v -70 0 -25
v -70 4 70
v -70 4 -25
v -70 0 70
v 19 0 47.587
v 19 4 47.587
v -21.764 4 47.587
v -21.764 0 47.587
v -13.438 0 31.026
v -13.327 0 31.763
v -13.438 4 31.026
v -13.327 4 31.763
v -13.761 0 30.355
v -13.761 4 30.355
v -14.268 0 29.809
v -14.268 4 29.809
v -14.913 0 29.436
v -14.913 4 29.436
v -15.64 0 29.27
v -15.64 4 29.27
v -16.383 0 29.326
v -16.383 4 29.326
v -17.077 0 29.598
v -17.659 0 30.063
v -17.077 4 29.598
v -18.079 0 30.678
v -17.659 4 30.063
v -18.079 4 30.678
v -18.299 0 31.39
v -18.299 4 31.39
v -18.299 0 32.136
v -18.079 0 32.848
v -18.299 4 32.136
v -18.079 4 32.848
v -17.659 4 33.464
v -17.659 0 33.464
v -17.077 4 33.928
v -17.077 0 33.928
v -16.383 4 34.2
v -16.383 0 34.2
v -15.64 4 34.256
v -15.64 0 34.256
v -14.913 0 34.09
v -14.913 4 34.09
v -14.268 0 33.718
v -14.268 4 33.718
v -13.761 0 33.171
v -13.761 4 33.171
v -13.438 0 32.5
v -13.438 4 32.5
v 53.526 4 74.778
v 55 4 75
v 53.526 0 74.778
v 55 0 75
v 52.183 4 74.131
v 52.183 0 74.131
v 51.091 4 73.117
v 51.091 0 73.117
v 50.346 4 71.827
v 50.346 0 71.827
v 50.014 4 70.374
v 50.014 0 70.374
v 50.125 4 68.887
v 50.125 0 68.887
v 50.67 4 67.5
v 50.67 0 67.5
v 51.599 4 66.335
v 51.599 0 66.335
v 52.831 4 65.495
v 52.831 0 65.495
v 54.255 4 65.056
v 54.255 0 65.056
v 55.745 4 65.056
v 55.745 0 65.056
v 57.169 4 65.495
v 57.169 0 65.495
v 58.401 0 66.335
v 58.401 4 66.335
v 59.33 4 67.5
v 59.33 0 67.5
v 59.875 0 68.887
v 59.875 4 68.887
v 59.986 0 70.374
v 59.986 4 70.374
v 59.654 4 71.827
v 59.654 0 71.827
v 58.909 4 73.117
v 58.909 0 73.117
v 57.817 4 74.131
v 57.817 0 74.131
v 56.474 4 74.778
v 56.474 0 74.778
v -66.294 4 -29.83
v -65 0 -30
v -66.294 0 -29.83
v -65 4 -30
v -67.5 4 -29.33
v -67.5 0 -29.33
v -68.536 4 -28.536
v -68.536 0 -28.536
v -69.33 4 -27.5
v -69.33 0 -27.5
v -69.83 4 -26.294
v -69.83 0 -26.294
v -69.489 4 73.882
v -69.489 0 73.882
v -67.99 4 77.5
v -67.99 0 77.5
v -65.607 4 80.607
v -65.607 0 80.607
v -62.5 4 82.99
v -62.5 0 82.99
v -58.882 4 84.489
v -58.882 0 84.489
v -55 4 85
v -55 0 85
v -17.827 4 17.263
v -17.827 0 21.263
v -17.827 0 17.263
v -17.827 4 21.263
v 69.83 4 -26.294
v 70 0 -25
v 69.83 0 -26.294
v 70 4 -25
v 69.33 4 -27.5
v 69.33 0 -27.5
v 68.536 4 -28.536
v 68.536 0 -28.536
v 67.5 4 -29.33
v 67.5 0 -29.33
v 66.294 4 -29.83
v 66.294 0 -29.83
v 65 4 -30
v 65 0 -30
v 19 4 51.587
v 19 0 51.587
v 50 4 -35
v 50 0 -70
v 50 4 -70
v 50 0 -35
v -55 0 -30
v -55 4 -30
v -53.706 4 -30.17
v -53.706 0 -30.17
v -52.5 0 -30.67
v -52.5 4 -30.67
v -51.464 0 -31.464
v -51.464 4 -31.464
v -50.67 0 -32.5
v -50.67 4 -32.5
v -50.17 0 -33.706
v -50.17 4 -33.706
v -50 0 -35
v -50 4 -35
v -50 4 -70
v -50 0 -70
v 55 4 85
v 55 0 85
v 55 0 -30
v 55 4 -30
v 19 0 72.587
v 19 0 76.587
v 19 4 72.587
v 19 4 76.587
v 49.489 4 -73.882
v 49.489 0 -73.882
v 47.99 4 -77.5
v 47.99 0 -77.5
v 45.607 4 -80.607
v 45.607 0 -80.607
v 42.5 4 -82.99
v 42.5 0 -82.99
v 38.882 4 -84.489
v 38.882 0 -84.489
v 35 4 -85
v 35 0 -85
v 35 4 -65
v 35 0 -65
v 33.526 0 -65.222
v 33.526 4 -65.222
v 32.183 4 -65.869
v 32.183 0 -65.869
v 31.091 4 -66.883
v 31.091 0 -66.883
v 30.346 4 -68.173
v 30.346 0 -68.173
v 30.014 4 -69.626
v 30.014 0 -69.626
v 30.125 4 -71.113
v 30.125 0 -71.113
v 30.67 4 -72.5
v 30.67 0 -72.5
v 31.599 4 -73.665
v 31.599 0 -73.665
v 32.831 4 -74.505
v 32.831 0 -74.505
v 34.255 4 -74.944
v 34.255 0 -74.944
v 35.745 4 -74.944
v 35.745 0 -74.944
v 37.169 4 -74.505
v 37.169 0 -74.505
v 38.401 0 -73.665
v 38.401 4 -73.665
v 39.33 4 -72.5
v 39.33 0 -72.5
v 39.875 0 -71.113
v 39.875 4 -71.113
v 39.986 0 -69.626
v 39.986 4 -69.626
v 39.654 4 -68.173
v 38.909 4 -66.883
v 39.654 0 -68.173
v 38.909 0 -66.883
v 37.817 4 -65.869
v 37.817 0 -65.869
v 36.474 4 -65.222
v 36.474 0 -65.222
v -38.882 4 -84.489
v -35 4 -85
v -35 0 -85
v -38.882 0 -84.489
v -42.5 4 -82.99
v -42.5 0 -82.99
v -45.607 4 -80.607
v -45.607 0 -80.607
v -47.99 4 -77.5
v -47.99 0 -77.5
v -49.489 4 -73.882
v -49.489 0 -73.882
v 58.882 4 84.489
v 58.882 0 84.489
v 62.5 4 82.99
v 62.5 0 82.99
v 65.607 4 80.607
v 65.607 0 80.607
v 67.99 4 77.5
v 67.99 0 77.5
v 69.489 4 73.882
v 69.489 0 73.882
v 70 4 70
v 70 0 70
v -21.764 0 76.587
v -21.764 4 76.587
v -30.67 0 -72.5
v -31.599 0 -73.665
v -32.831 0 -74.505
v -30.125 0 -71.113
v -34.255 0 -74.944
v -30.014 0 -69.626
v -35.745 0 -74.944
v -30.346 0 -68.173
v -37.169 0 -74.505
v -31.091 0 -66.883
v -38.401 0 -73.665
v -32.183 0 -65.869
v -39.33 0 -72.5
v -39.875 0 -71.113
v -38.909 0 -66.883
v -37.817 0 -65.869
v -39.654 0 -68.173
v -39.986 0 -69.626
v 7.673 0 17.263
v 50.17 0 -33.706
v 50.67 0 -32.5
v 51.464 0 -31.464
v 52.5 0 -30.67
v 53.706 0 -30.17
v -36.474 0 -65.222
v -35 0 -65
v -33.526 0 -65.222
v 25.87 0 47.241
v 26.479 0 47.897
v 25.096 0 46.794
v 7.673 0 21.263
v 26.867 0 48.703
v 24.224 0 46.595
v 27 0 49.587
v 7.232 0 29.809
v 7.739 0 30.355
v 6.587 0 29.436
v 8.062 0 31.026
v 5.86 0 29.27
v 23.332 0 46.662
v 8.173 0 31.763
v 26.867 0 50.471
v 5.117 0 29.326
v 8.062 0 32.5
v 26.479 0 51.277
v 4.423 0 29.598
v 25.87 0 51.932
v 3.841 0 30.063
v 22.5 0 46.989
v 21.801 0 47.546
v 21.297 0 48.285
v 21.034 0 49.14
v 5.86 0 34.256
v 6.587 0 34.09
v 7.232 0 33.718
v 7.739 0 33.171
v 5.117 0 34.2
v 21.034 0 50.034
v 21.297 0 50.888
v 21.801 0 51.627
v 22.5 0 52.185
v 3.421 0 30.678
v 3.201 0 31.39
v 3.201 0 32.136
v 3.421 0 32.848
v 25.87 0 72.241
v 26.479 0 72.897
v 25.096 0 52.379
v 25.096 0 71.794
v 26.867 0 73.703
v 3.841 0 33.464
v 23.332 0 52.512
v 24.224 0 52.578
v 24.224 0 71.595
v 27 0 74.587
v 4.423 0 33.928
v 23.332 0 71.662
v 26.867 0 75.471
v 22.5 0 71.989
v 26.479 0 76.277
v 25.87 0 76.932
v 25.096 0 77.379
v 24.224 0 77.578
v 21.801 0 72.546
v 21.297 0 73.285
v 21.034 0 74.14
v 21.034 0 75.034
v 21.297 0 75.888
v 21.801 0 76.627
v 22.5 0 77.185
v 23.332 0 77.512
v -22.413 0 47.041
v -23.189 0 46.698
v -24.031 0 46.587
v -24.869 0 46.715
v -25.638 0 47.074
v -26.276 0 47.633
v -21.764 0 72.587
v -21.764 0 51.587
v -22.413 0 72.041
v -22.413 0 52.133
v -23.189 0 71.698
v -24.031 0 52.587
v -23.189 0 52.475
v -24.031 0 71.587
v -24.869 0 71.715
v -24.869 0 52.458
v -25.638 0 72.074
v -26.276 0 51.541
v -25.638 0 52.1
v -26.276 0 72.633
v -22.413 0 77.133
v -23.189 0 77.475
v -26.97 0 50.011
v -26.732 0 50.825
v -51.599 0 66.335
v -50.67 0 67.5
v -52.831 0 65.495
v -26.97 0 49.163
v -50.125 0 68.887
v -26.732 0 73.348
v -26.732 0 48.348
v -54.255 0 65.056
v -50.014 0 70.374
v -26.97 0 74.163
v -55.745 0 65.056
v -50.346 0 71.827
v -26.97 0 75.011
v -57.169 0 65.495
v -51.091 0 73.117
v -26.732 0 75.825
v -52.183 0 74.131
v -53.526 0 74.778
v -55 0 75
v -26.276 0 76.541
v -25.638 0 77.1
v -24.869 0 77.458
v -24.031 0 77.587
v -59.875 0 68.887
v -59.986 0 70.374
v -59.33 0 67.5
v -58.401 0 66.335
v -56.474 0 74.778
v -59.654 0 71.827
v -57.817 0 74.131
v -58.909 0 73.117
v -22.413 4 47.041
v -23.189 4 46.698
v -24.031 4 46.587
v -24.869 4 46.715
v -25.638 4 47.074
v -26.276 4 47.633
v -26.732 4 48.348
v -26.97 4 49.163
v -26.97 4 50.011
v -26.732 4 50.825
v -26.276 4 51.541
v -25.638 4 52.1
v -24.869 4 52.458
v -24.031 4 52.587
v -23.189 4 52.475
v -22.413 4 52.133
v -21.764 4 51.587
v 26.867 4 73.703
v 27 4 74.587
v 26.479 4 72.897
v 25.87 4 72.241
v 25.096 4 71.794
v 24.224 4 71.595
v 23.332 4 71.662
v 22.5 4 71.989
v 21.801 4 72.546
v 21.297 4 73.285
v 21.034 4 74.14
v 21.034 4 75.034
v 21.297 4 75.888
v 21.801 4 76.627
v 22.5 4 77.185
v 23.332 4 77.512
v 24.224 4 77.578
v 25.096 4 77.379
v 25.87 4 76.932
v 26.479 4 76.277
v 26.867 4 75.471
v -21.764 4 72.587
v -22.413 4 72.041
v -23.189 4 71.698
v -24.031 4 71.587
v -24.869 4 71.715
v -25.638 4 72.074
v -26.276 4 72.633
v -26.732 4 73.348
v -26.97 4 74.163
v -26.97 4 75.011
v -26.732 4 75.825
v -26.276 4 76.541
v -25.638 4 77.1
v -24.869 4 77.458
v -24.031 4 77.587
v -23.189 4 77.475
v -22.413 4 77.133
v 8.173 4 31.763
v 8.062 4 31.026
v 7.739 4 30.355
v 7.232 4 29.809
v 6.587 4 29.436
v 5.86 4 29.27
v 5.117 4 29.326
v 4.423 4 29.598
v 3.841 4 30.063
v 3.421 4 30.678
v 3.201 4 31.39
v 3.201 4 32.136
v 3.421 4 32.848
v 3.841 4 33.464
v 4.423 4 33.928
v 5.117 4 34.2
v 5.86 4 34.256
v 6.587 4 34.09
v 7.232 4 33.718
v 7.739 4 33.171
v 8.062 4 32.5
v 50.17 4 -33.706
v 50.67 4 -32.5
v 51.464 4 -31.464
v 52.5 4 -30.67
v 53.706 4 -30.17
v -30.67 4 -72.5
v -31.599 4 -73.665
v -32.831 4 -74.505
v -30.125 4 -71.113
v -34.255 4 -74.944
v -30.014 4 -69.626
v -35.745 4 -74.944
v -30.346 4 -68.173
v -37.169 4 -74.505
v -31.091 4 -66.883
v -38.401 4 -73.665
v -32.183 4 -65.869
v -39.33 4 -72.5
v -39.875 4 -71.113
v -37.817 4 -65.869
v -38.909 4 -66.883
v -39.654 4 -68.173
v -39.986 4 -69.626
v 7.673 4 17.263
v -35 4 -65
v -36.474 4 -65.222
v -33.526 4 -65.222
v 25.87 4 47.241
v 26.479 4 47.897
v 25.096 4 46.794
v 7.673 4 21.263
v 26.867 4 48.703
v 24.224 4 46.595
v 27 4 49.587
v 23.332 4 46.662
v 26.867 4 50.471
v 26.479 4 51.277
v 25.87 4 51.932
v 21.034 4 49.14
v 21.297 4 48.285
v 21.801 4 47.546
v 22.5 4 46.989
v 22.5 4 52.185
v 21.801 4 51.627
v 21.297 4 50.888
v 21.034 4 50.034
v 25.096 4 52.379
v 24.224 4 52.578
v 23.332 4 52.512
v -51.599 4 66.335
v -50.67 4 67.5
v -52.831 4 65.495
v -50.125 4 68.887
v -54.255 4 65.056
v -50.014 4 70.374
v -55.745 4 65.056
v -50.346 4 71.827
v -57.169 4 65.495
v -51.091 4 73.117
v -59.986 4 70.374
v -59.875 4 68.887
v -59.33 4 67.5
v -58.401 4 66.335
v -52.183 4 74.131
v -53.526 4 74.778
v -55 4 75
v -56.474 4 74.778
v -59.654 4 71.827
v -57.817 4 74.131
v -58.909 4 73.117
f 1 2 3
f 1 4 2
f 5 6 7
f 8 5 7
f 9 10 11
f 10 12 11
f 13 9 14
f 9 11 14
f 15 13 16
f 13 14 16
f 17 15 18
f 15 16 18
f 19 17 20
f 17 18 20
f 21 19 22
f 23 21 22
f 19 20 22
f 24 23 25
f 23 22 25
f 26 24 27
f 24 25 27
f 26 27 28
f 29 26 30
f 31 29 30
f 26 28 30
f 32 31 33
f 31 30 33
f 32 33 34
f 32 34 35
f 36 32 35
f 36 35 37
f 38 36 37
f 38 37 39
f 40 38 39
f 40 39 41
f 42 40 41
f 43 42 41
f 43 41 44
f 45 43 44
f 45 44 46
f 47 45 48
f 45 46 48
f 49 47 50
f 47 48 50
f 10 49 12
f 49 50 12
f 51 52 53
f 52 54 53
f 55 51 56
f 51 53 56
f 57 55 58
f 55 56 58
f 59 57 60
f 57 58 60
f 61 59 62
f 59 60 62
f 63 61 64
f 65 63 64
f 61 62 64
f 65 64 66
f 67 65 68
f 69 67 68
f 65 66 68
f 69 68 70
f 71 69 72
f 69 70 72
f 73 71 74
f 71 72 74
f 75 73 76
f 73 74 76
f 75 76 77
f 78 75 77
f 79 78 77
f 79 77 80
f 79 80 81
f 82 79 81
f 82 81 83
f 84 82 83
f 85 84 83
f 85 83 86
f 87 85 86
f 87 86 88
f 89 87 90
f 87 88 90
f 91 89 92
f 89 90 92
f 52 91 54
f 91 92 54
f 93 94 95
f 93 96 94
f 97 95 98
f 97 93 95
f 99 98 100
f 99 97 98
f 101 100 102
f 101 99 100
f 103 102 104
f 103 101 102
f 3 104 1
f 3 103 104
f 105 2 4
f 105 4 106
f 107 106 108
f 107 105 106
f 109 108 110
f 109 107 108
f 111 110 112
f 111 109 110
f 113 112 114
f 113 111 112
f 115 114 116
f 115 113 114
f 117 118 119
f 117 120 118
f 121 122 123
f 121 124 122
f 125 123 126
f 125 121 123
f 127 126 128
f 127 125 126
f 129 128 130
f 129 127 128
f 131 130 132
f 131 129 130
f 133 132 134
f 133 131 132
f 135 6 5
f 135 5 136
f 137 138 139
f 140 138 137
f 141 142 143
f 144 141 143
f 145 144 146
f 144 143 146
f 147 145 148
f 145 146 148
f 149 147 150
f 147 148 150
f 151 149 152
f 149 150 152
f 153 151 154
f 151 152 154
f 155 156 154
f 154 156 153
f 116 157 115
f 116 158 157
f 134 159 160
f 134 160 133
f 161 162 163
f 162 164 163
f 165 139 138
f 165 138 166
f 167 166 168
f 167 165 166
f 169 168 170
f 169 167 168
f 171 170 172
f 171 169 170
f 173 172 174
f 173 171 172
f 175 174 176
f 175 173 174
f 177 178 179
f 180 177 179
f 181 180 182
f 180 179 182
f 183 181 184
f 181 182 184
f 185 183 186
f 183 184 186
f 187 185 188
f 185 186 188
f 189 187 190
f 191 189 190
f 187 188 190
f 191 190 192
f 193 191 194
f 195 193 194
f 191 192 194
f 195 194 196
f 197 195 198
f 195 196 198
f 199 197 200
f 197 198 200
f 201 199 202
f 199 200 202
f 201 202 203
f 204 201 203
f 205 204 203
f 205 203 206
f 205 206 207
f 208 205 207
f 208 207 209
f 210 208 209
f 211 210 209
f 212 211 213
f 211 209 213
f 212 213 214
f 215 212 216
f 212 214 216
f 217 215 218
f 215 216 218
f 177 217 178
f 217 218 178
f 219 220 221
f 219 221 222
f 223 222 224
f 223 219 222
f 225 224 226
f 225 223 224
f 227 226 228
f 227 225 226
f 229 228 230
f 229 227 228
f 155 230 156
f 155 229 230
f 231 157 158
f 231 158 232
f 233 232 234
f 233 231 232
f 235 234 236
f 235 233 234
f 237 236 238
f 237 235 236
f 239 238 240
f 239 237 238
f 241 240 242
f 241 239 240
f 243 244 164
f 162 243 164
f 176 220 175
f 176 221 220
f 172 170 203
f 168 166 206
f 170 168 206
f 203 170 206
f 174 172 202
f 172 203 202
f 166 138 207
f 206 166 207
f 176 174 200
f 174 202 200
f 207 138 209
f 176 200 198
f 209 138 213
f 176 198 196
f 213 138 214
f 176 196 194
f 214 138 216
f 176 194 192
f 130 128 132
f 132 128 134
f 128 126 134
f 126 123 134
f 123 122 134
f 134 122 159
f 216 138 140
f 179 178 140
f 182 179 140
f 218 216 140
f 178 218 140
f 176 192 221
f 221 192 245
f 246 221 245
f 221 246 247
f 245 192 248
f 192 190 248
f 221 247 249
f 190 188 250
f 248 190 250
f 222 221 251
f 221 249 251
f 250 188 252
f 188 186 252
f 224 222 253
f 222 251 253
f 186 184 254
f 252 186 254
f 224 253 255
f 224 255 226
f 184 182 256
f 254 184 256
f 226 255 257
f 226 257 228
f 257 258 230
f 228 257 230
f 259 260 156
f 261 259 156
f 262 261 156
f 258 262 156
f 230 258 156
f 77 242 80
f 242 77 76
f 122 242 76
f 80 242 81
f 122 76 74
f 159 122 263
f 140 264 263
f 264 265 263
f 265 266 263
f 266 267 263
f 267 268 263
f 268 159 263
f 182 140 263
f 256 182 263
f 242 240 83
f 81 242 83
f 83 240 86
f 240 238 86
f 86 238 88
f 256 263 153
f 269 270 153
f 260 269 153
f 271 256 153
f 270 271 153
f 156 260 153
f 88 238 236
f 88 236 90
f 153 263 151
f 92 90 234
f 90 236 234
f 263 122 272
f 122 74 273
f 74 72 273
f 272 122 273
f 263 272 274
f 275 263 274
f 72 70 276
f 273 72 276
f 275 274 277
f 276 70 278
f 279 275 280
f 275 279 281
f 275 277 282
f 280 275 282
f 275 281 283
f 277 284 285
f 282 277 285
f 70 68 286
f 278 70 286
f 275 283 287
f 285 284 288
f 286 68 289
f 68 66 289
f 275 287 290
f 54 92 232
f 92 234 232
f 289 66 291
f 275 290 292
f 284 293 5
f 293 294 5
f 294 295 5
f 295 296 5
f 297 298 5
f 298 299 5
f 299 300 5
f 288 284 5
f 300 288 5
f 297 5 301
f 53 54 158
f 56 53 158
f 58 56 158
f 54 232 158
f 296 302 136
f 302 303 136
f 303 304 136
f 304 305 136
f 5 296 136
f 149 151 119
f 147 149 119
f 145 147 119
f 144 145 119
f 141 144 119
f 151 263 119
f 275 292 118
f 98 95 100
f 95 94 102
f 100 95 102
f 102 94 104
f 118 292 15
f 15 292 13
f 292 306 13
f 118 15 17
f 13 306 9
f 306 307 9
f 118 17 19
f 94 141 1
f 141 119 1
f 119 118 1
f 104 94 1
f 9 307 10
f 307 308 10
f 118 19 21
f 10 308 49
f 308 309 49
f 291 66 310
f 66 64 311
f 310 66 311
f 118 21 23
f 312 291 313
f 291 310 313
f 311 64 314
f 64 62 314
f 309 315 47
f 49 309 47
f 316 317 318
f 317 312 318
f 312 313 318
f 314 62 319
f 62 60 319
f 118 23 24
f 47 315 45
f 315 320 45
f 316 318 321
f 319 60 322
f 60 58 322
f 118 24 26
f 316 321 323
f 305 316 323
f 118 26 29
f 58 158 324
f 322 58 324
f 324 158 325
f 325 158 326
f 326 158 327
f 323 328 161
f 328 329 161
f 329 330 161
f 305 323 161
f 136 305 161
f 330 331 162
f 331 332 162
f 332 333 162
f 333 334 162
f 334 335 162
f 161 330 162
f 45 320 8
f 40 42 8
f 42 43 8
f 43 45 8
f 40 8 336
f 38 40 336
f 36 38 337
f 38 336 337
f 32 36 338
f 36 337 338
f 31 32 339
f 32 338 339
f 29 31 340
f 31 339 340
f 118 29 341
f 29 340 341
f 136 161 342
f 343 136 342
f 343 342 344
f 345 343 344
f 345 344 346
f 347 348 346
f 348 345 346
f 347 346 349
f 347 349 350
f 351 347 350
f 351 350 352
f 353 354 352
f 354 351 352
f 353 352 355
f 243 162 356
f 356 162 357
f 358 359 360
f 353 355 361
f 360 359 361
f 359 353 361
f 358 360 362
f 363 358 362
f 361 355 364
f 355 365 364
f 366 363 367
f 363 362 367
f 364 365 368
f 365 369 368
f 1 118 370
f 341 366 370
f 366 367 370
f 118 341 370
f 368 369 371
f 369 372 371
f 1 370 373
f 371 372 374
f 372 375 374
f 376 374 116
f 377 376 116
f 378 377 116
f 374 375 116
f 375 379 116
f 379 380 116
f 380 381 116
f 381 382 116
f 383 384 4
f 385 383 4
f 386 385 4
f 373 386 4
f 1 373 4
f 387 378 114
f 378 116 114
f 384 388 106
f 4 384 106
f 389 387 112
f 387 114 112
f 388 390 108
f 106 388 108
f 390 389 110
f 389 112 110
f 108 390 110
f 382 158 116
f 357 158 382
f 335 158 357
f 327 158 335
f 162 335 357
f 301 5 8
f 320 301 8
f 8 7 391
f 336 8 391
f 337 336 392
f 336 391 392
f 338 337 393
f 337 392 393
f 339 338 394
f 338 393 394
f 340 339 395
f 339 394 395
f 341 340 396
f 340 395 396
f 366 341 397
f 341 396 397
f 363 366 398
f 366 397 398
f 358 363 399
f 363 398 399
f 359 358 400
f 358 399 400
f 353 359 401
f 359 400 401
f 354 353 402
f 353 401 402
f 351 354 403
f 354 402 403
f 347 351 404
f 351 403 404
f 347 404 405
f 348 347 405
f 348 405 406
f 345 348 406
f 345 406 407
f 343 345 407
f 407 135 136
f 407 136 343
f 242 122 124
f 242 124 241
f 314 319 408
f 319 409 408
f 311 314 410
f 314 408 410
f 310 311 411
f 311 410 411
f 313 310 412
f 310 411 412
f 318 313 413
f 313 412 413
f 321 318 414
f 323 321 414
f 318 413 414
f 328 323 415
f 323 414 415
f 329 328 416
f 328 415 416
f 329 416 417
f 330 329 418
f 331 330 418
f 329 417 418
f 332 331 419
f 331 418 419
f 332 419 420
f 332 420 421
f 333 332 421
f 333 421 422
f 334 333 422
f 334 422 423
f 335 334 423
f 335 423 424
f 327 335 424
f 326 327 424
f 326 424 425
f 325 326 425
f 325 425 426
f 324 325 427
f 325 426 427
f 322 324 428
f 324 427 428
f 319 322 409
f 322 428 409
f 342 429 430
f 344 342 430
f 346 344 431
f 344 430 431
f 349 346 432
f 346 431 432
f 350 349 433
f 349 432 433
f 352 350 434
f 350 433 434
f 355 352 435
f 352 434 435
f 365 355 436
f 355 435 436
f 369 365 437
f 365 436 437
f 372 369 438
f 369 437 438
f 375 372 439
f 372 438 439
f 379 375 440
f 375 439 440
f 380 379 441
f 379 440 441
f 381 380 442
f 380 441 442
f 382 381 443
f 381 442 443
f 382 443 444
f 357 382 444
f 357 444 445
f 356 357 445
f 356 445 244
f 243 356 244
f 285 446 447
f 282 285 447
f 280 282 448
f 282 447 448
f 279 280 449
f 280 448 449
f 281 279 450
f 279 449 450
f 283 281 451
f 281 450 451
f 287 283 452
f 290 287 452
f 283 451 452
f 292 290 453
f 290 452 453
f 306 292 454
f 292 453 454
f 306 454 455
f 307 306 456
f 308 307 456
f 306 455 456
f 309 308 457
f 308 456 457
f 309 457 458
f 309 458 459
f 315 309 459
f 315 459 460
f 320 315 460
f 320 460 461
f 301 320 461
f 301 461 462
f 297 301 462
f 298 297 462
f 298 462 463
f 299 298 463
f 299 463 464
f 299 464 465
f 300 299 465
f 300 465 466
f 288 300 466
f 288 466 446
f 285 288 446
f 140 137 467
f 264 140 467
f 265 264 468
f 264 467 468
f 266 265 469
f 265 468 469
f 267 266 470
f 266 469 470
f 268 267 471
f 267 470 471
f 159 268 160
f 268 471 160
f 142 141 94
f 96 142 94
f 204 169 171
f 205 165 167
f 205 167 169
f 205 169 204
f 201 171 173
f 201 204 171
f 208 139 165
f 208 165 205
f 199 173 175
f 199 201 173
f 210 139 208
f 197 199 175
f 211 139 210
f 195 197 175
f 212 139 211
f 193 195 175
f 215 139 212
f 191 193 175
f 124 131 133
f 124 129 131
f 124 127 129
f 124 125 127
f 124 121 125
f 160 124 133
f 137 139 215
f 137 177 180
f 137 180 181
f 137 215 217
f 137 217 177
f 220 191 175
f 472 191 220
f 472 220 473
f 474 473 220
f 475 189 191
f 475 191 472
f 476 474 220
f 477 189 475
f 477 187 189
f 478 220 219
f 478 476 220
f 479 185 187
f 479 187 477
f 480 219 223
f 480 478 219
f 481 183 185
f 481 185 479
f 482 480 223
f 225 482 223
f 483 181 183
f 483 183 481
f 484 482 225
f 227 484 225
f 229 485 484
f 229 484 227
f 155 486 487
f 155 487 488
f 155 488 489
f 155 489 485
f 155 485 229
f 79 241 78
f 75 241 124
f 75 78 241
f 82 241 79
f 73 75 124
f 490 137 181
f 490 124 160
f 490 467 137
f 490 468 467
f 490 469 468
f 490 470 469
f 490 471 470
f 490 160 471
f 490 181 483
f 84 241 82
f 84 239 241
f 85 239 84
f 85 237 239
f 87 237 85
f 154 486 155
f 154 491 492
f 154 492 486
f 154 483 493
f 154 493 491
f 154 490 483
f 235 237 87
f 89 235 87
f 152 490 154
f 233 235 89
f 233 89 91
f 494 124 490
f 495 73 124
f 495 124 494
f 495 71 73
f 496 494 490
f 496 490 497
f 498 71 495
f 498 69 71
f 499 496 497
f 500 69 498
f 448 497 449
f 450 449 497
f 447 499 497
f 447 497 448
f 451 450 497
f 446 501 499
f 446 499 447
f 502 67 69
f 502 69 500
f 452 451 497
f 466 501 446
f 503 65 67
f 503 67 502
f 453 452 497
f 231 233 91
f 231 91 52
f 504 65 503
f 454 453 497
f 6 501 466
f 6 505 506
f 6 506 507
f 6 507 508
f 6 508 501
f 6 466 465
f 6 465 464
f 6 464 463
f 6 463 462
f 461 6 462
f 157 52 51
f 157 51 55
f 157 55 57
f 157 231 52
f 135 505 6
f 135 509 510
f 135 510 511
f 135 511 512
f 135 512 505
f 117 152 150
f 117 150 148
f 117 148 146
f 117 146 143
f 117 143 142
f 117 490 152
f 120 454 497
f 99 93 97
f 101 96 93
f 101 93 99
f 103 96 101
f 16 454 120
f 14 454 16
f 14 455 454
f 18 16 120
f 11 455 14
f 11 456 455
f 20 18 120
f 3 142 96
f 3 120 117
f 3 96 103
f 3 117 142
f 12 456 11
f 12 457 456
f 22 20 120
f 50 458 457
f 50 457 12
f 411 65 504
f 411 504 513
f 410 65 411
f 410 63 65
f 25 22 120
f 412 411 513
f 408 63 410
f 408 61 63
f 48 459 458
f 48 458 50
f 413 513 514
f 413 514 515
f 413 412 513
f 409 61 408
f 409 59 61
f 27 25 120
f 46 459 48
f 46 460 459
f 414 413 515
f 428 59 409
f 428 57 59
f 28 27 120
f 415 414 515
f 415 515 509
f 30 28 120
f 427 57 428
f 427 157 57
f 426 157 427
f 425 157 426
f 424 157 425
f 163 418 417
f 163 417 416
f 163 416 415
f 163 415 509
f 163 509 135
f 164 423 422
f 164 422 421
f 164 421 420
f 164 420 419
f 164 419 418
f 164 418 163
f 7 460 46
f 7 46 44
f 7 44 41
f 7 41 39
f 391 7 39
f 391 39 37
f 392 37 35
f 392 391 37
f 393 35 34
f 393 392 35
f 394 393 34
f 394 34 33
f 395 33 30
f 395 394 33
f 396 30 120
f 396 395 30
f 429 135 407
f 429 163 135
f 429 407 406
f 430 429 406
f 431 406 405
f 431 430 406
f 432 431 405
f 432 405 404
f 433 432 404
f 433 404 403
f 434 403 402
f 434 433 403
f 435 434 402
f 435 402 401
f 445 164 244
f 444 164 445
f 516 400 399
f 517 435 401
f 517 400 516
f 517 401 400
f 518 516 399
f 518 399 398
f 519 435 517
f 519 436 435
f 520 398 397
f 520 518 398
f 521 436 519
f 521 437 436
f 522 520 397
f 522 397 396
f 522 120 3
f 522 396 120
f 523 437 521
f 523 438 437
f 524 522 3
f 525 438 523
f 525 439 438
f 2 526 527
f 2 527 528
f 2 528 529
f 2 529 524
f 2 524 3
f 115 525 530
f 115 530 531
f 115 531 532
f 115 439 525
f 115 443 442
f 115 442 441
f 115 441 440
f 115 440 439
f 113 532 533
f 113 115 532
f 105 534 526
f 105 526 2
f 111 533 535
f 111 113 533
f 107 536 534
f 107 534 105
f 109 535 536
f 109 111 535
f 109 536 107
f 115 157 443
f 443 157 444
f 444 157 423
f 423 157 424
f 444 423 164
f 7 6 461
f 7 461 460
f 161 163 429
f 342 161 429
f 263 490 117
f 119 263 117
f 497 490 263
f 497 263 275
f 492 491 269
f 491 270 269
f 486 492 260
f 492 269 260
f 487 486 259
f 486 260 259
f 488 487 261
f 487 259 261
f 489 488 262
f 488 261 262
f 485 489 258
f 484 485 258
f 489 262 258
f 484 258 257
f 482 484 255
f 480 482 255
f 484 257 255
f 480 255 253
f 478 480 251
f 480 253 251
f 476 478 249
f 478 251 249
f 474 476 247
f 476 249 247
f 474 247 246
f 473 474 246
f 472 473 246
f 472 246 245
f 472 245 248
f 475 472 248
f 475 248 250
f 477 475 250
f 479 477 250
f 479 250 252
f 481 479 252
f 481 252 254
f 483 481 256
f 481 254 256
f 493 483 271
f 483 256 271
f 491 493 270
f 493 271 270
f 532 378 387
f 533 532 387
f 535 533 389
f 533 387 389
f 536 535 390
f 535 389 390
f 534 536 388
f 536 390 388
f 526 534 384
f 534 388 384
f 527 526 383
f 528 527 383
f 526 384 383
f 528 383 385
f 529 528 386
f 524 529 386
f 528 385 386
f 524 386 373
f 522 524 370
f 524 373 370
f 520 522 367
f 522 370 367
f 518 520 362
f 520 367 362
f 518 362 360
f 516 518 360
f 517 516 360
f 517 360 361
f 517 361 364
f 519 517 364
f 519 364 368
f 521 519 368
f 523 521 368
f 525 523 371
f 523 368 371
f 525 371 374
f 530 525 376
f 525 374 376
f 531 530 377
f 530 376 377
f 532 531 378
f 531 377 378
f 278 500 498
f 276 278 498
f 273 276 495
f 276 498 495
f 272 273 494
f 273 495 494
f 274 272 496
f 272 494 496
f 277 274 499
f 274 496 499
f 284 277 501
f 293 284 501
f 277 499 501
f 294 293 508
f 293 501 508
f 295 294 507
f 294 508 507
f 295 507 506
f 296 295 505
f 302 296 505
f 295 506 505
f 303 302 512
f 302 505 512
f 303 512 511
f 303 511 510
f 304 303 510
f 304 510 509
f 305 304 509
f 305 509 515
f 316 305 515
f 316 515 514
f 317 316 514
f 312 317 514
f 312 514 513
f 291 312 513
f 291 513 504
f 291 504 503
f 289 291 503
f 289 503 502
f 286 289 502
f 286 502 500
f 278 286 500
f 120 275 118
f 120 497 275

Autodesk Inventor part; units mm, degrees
ref_plane "YZ Plane" through (0, 0, 0) normal (1, 0, 0) x (0, 1, 0)
ref_plane "XZ Plane" through (0, 0, 0) normal (0, 1, 0) x (-1, 0, 0)
ref_plane "XY Plane" through (0, 0, 0) normal (0, 0, 1) x (1, 0, 0)
sketch "Sketch1" plane through (0, 0, 0) normal (0, 1, 0) x (-1, 0, 0)
  line L0 (-70, 85) -> (70, 85)
  line L1 (70, 85) -> (70, -85)
  line L2 (70, -85) -> (-70, -85)
  line L3 (-70, -85) -> (-70, 85)
  line L4 (-70, 85) -> (70, -85) construction
  line L5 (70, 85) -> (-70, -85) construction
  line L6 (98, 0) -> (-98, 0) projected
  line L7 (70, -85) -> (50, -85)
  line L8 (50, -85) -> (50, -30)
  line L9 (50, -30) -> (70, -30)
  line L10 (70, -30) -> (70, -85)
  line L11 (-70, -85) -> (-50, -85)
  line L12 (-50, -85) -> (-50, -30)
  line L13 (-50, -30) -> (-70, -30)
  line L14 (-70, -30) -> (-70, -85)
  point P0 (0, 0)
  dimension "d0" = 140
  dimension "d1" = 170
  dimension "d35" = 20
  dimension "d36" = 55
  dimension "d37" = 20
  dimension "d38" = 55
extrude "Extrusion1" add sketch "Sketch1" along normal blind 4 contours L0 L1 L6 L3 | L6 L1 L9 L8 L2 L12 L13 L3
fillet "Fillet1" radius 15 2 edges at (-70, 2, 85) (70, 2, 85)
fillet "Fillet2" radius 15 2 edges at (-50, 2, -85) (50, 2, -85)
sketch "Sketch2" plane through (0, 4, 0) normal (0, 1, 0) x (1, 0, 0)
  line L0 (-70, 30) -> (-70, -70) projected
  arc A0 (-70, -70) -> (-55, -85) centre (-55, -70) ccw projected
  line L1 (-55, -85) -> (55, -85) projected
  arc A1 (55, -85) -> (70, -70) centre (55, -70) ccw projected
  line L2 (70, -70) -> (70, 30) projected
  line L3 (35, 85) -> (-35, 85) projected
  line L4 (70, 30) -> (50, 30) projected
  line L5 (50, 30) -> (50, 70) projected
  line L6 (-50, 70) -> (-50, 30) projected
  line L7 (-50, 30) -> (-70, 30) projected
  arc A2 (50, 70) -> (35, 85) centre (35, 70) ccw projected
  arc A3 (-35, 85) -> (-50, 70) centre (-35, 70) ccw projected
  point P0 (0, 0)
  point P1 (-4.3272, -2.2983)
hole "Hole1" at (55, 4, 70) at (-55, 4, 70) at (35, 4, -70) at (-35, 4, -70) direction (0, -1, 0) diameter 10 depth 4
sketch "Sketch3" plane through (0, 4, 0) normal (0, 1, 0) x (1, 0, 0)
  line L0 (22.8472, -55) -> (-47.1528, -55)
  line L1 (-47.1528, -55) -> (-47.1528, 27)
  line L2 (-47.1528, 27) -> (22.8472, 27)
  line L3 (22.8472, 27) -> (22.8472, -55)
  line L4 (22.8472, -55) -> (-47.1528, 27) construction
  line L5 (-47.1528, -55) -> (22.8472, 27) construction
  line L6 (-55, -85) -> (55, -85) projected
  point P0 (0, 0)
  point P1 (-12.1528, -14)
  dimension "d12" = 70
  dimension "d13" = 82
  dimension "d34" = 30
fillet "Fillet3" radius 5 4 edges at (-50, 2, -30) (-70, 2, -30) (70, 2, -30) (50, 2, -30)
sketch "Sketch5" plane through (0, 4, 0) normal (0, 1, 0) x (1, 0, 0)
  line L0 (-55, 12.5998) -> (-25, 12.5998)
  line L1 (-25, 12.5998) -> (-25, -27.4002)
  line L2 (-25, -27.4002) -> (-55, -27.4002)
  line L3 (-55, -27.4002) -> (-55, 12.5998)
  line L4 (0, -27.4002) -> (0, 4.9411)
  line L5 (-24, -76.5868) -> (24, -76.5868)
  line L6 (26, -74.5868) -> (26, -49.5868)
  line L7 (24, -47.5868) -> (-24, -47.5868)
  line L8 (-26, -49.5868) -> (-26, -74.5868)
  arc A0 (24, -76.5868) -> (26, -74.5868) centre (24, -74.5868) ccw
  arc A1 (-24, -47.5868) -> (-26, -49.5868) centre (-24, -49.5868) ccw
  arc A2 (26, -49.5868) -> (24, -47.5868) centre (24, -49.5868) ccw
  arc A3 (-26, -74.5868) -> (-24, -76.5868) centre (-24, -74.5868) ccw
  circle A4 centre (24, -74.5868) radius 3
  circle A5 centre (24, -49.5868) radius 3
  circle A6 centre (-24, -49.5868) radius 3
  circle A7 centre (-24, -74.5868) radius 3
  line L9 (-22, -76.5868) -> (19, -76.5868)
  line L10 (19, -76.5868) -> (19, -72.5868)
  line L11 (19, -72.5868) -> (-22, -72.5868)
  line L12 (-22, -72.5868) -> (-22, -76.5868)
  line L13 (26, -62.0868) -> (21, -62.0868)
  line L14 (19, -47.5868) -> (19, -51.5868)
  line L15 (19, -51.5868) -> (-22, -51.5868)
  line L16 (-22, -51.5868) -> (-22, -47.5868)
  line L17 (55, 12.5998) -> (25, 12.5998)
  line L18 (25, 12.5998) -> (25, -27.4002)
  line L19 (25, -27.4002) -> (55, -27.4002)
  line L20 (5.6733, -33.7631) -> (-15.8267, -33.7631)
  line L21 (-17.8267, -31.7631) -> (-17.8267, -18.2631)
  line L22 (-17.8267, -18.2631) -> (7.6733, -18.2631)
  line L23 (7.6733, -18.2631) -> (7.6733, -31.7631)
  arc A8 (-17.8267, -31.7631) -> (-15.8267, -33.7631) centre (-15.8267, -31.7631) ccw
  arc A9 (-17.8267, -31.7631) -> (-15.8267, -33.7631) centre (-15.8267, -31.7631) ccw
  arc A10 (5.6733, -33.7631) -> (7.6733, -31.7631) centre (5.6733, -31.7631) ccw
  circle A11 centre (-15.8267, -31.7631) radius 2.5
  circle A12 centre (5.6733, -31.7631) radius 2.5
  line L24 (-17.8267, -18.2631) -> (7.6733, -18.2631)
  line L25 (7.6733, -18.2631) -> (7.6733, -21.2631)
  line L26 (7.6733, -21.2631) -> (-17.8267, -21.2631)
  line L27 (-17.8267, -21.2631) -> (-17.8267, -18.2631)
  line L28 (-17.8267, -18.2631) -> (7.6733, -18.2631)
  line L29 (7.6733, -18.2631) -> (7.6733, -17.2631)
  line L30 (7.6733, -17.2631) -> (-17.8267, -17.2631)
  line L31 (-17.8267, -17.2631) -> (-17.8267, -18.2631)
  point P0 (0, 0)
  point P1 (26, -47.5868)
  point P2 (26, -76.5868)
  point P3 (-26, -47.5868)
  point P4 (-17.8267, -33.7631)
  point P5 (-21.7639, -47.5868)
  point P6 (-21.7639, -51.5868)
  point P7 (-21.7639, -72.5868)
  point P8 (-21.7639, -76.5868)
  point P9 (19, -76.5868)
  dimension "d41" = 30
  dimension "d42" = 40
  dimension "d43" = 52
  dimension "d44" = 29
  dimension "d45" = 2
  dimension "d46" = 6
  dimension "d47" = 6
  dimension "d48" = 6
  dimension "d49" = 6
  dimension "d50" = 4
  dimension "d51" = 41
  dimension "d52" = 7
  dimension "d53" = 25.5
  dimension "d54" = 15.5
  dimension "d55" = 2
  dimension "d56" = 5
  dimension "d57" = 5
  dimension "d62" = 3
  dimension "d63" = 1
extrude "Extrusion3" cut sketch "Sketch5" against normal up to next contours L26 L21 L22 L4 | L4 L22 L23 L26 | L22 L31 L30 L4 | L4 L30 L29 L22 | A12 L20 A10 L23 | L23 A10 L20 A12 | A11 L20 A8 L21 | L21 A8 L20 A11 | A3 L8 A7 L11 L12 L5 | L5 A7 L8 A3 | L12 L11 A7 L5 | A7 L11 L10 L5 | A6 L7 A1 L8 | L8 A1 L7 L16 L15 A6 | A4 L6 A0 L5 | L5 A0 L6 A4 | A6 L15 L16 L7 | L7 L14 L15 A6 | A5 L6 A2 L7 | L7 A2 L6 A5
properties part number "Base2" material "PLA"
